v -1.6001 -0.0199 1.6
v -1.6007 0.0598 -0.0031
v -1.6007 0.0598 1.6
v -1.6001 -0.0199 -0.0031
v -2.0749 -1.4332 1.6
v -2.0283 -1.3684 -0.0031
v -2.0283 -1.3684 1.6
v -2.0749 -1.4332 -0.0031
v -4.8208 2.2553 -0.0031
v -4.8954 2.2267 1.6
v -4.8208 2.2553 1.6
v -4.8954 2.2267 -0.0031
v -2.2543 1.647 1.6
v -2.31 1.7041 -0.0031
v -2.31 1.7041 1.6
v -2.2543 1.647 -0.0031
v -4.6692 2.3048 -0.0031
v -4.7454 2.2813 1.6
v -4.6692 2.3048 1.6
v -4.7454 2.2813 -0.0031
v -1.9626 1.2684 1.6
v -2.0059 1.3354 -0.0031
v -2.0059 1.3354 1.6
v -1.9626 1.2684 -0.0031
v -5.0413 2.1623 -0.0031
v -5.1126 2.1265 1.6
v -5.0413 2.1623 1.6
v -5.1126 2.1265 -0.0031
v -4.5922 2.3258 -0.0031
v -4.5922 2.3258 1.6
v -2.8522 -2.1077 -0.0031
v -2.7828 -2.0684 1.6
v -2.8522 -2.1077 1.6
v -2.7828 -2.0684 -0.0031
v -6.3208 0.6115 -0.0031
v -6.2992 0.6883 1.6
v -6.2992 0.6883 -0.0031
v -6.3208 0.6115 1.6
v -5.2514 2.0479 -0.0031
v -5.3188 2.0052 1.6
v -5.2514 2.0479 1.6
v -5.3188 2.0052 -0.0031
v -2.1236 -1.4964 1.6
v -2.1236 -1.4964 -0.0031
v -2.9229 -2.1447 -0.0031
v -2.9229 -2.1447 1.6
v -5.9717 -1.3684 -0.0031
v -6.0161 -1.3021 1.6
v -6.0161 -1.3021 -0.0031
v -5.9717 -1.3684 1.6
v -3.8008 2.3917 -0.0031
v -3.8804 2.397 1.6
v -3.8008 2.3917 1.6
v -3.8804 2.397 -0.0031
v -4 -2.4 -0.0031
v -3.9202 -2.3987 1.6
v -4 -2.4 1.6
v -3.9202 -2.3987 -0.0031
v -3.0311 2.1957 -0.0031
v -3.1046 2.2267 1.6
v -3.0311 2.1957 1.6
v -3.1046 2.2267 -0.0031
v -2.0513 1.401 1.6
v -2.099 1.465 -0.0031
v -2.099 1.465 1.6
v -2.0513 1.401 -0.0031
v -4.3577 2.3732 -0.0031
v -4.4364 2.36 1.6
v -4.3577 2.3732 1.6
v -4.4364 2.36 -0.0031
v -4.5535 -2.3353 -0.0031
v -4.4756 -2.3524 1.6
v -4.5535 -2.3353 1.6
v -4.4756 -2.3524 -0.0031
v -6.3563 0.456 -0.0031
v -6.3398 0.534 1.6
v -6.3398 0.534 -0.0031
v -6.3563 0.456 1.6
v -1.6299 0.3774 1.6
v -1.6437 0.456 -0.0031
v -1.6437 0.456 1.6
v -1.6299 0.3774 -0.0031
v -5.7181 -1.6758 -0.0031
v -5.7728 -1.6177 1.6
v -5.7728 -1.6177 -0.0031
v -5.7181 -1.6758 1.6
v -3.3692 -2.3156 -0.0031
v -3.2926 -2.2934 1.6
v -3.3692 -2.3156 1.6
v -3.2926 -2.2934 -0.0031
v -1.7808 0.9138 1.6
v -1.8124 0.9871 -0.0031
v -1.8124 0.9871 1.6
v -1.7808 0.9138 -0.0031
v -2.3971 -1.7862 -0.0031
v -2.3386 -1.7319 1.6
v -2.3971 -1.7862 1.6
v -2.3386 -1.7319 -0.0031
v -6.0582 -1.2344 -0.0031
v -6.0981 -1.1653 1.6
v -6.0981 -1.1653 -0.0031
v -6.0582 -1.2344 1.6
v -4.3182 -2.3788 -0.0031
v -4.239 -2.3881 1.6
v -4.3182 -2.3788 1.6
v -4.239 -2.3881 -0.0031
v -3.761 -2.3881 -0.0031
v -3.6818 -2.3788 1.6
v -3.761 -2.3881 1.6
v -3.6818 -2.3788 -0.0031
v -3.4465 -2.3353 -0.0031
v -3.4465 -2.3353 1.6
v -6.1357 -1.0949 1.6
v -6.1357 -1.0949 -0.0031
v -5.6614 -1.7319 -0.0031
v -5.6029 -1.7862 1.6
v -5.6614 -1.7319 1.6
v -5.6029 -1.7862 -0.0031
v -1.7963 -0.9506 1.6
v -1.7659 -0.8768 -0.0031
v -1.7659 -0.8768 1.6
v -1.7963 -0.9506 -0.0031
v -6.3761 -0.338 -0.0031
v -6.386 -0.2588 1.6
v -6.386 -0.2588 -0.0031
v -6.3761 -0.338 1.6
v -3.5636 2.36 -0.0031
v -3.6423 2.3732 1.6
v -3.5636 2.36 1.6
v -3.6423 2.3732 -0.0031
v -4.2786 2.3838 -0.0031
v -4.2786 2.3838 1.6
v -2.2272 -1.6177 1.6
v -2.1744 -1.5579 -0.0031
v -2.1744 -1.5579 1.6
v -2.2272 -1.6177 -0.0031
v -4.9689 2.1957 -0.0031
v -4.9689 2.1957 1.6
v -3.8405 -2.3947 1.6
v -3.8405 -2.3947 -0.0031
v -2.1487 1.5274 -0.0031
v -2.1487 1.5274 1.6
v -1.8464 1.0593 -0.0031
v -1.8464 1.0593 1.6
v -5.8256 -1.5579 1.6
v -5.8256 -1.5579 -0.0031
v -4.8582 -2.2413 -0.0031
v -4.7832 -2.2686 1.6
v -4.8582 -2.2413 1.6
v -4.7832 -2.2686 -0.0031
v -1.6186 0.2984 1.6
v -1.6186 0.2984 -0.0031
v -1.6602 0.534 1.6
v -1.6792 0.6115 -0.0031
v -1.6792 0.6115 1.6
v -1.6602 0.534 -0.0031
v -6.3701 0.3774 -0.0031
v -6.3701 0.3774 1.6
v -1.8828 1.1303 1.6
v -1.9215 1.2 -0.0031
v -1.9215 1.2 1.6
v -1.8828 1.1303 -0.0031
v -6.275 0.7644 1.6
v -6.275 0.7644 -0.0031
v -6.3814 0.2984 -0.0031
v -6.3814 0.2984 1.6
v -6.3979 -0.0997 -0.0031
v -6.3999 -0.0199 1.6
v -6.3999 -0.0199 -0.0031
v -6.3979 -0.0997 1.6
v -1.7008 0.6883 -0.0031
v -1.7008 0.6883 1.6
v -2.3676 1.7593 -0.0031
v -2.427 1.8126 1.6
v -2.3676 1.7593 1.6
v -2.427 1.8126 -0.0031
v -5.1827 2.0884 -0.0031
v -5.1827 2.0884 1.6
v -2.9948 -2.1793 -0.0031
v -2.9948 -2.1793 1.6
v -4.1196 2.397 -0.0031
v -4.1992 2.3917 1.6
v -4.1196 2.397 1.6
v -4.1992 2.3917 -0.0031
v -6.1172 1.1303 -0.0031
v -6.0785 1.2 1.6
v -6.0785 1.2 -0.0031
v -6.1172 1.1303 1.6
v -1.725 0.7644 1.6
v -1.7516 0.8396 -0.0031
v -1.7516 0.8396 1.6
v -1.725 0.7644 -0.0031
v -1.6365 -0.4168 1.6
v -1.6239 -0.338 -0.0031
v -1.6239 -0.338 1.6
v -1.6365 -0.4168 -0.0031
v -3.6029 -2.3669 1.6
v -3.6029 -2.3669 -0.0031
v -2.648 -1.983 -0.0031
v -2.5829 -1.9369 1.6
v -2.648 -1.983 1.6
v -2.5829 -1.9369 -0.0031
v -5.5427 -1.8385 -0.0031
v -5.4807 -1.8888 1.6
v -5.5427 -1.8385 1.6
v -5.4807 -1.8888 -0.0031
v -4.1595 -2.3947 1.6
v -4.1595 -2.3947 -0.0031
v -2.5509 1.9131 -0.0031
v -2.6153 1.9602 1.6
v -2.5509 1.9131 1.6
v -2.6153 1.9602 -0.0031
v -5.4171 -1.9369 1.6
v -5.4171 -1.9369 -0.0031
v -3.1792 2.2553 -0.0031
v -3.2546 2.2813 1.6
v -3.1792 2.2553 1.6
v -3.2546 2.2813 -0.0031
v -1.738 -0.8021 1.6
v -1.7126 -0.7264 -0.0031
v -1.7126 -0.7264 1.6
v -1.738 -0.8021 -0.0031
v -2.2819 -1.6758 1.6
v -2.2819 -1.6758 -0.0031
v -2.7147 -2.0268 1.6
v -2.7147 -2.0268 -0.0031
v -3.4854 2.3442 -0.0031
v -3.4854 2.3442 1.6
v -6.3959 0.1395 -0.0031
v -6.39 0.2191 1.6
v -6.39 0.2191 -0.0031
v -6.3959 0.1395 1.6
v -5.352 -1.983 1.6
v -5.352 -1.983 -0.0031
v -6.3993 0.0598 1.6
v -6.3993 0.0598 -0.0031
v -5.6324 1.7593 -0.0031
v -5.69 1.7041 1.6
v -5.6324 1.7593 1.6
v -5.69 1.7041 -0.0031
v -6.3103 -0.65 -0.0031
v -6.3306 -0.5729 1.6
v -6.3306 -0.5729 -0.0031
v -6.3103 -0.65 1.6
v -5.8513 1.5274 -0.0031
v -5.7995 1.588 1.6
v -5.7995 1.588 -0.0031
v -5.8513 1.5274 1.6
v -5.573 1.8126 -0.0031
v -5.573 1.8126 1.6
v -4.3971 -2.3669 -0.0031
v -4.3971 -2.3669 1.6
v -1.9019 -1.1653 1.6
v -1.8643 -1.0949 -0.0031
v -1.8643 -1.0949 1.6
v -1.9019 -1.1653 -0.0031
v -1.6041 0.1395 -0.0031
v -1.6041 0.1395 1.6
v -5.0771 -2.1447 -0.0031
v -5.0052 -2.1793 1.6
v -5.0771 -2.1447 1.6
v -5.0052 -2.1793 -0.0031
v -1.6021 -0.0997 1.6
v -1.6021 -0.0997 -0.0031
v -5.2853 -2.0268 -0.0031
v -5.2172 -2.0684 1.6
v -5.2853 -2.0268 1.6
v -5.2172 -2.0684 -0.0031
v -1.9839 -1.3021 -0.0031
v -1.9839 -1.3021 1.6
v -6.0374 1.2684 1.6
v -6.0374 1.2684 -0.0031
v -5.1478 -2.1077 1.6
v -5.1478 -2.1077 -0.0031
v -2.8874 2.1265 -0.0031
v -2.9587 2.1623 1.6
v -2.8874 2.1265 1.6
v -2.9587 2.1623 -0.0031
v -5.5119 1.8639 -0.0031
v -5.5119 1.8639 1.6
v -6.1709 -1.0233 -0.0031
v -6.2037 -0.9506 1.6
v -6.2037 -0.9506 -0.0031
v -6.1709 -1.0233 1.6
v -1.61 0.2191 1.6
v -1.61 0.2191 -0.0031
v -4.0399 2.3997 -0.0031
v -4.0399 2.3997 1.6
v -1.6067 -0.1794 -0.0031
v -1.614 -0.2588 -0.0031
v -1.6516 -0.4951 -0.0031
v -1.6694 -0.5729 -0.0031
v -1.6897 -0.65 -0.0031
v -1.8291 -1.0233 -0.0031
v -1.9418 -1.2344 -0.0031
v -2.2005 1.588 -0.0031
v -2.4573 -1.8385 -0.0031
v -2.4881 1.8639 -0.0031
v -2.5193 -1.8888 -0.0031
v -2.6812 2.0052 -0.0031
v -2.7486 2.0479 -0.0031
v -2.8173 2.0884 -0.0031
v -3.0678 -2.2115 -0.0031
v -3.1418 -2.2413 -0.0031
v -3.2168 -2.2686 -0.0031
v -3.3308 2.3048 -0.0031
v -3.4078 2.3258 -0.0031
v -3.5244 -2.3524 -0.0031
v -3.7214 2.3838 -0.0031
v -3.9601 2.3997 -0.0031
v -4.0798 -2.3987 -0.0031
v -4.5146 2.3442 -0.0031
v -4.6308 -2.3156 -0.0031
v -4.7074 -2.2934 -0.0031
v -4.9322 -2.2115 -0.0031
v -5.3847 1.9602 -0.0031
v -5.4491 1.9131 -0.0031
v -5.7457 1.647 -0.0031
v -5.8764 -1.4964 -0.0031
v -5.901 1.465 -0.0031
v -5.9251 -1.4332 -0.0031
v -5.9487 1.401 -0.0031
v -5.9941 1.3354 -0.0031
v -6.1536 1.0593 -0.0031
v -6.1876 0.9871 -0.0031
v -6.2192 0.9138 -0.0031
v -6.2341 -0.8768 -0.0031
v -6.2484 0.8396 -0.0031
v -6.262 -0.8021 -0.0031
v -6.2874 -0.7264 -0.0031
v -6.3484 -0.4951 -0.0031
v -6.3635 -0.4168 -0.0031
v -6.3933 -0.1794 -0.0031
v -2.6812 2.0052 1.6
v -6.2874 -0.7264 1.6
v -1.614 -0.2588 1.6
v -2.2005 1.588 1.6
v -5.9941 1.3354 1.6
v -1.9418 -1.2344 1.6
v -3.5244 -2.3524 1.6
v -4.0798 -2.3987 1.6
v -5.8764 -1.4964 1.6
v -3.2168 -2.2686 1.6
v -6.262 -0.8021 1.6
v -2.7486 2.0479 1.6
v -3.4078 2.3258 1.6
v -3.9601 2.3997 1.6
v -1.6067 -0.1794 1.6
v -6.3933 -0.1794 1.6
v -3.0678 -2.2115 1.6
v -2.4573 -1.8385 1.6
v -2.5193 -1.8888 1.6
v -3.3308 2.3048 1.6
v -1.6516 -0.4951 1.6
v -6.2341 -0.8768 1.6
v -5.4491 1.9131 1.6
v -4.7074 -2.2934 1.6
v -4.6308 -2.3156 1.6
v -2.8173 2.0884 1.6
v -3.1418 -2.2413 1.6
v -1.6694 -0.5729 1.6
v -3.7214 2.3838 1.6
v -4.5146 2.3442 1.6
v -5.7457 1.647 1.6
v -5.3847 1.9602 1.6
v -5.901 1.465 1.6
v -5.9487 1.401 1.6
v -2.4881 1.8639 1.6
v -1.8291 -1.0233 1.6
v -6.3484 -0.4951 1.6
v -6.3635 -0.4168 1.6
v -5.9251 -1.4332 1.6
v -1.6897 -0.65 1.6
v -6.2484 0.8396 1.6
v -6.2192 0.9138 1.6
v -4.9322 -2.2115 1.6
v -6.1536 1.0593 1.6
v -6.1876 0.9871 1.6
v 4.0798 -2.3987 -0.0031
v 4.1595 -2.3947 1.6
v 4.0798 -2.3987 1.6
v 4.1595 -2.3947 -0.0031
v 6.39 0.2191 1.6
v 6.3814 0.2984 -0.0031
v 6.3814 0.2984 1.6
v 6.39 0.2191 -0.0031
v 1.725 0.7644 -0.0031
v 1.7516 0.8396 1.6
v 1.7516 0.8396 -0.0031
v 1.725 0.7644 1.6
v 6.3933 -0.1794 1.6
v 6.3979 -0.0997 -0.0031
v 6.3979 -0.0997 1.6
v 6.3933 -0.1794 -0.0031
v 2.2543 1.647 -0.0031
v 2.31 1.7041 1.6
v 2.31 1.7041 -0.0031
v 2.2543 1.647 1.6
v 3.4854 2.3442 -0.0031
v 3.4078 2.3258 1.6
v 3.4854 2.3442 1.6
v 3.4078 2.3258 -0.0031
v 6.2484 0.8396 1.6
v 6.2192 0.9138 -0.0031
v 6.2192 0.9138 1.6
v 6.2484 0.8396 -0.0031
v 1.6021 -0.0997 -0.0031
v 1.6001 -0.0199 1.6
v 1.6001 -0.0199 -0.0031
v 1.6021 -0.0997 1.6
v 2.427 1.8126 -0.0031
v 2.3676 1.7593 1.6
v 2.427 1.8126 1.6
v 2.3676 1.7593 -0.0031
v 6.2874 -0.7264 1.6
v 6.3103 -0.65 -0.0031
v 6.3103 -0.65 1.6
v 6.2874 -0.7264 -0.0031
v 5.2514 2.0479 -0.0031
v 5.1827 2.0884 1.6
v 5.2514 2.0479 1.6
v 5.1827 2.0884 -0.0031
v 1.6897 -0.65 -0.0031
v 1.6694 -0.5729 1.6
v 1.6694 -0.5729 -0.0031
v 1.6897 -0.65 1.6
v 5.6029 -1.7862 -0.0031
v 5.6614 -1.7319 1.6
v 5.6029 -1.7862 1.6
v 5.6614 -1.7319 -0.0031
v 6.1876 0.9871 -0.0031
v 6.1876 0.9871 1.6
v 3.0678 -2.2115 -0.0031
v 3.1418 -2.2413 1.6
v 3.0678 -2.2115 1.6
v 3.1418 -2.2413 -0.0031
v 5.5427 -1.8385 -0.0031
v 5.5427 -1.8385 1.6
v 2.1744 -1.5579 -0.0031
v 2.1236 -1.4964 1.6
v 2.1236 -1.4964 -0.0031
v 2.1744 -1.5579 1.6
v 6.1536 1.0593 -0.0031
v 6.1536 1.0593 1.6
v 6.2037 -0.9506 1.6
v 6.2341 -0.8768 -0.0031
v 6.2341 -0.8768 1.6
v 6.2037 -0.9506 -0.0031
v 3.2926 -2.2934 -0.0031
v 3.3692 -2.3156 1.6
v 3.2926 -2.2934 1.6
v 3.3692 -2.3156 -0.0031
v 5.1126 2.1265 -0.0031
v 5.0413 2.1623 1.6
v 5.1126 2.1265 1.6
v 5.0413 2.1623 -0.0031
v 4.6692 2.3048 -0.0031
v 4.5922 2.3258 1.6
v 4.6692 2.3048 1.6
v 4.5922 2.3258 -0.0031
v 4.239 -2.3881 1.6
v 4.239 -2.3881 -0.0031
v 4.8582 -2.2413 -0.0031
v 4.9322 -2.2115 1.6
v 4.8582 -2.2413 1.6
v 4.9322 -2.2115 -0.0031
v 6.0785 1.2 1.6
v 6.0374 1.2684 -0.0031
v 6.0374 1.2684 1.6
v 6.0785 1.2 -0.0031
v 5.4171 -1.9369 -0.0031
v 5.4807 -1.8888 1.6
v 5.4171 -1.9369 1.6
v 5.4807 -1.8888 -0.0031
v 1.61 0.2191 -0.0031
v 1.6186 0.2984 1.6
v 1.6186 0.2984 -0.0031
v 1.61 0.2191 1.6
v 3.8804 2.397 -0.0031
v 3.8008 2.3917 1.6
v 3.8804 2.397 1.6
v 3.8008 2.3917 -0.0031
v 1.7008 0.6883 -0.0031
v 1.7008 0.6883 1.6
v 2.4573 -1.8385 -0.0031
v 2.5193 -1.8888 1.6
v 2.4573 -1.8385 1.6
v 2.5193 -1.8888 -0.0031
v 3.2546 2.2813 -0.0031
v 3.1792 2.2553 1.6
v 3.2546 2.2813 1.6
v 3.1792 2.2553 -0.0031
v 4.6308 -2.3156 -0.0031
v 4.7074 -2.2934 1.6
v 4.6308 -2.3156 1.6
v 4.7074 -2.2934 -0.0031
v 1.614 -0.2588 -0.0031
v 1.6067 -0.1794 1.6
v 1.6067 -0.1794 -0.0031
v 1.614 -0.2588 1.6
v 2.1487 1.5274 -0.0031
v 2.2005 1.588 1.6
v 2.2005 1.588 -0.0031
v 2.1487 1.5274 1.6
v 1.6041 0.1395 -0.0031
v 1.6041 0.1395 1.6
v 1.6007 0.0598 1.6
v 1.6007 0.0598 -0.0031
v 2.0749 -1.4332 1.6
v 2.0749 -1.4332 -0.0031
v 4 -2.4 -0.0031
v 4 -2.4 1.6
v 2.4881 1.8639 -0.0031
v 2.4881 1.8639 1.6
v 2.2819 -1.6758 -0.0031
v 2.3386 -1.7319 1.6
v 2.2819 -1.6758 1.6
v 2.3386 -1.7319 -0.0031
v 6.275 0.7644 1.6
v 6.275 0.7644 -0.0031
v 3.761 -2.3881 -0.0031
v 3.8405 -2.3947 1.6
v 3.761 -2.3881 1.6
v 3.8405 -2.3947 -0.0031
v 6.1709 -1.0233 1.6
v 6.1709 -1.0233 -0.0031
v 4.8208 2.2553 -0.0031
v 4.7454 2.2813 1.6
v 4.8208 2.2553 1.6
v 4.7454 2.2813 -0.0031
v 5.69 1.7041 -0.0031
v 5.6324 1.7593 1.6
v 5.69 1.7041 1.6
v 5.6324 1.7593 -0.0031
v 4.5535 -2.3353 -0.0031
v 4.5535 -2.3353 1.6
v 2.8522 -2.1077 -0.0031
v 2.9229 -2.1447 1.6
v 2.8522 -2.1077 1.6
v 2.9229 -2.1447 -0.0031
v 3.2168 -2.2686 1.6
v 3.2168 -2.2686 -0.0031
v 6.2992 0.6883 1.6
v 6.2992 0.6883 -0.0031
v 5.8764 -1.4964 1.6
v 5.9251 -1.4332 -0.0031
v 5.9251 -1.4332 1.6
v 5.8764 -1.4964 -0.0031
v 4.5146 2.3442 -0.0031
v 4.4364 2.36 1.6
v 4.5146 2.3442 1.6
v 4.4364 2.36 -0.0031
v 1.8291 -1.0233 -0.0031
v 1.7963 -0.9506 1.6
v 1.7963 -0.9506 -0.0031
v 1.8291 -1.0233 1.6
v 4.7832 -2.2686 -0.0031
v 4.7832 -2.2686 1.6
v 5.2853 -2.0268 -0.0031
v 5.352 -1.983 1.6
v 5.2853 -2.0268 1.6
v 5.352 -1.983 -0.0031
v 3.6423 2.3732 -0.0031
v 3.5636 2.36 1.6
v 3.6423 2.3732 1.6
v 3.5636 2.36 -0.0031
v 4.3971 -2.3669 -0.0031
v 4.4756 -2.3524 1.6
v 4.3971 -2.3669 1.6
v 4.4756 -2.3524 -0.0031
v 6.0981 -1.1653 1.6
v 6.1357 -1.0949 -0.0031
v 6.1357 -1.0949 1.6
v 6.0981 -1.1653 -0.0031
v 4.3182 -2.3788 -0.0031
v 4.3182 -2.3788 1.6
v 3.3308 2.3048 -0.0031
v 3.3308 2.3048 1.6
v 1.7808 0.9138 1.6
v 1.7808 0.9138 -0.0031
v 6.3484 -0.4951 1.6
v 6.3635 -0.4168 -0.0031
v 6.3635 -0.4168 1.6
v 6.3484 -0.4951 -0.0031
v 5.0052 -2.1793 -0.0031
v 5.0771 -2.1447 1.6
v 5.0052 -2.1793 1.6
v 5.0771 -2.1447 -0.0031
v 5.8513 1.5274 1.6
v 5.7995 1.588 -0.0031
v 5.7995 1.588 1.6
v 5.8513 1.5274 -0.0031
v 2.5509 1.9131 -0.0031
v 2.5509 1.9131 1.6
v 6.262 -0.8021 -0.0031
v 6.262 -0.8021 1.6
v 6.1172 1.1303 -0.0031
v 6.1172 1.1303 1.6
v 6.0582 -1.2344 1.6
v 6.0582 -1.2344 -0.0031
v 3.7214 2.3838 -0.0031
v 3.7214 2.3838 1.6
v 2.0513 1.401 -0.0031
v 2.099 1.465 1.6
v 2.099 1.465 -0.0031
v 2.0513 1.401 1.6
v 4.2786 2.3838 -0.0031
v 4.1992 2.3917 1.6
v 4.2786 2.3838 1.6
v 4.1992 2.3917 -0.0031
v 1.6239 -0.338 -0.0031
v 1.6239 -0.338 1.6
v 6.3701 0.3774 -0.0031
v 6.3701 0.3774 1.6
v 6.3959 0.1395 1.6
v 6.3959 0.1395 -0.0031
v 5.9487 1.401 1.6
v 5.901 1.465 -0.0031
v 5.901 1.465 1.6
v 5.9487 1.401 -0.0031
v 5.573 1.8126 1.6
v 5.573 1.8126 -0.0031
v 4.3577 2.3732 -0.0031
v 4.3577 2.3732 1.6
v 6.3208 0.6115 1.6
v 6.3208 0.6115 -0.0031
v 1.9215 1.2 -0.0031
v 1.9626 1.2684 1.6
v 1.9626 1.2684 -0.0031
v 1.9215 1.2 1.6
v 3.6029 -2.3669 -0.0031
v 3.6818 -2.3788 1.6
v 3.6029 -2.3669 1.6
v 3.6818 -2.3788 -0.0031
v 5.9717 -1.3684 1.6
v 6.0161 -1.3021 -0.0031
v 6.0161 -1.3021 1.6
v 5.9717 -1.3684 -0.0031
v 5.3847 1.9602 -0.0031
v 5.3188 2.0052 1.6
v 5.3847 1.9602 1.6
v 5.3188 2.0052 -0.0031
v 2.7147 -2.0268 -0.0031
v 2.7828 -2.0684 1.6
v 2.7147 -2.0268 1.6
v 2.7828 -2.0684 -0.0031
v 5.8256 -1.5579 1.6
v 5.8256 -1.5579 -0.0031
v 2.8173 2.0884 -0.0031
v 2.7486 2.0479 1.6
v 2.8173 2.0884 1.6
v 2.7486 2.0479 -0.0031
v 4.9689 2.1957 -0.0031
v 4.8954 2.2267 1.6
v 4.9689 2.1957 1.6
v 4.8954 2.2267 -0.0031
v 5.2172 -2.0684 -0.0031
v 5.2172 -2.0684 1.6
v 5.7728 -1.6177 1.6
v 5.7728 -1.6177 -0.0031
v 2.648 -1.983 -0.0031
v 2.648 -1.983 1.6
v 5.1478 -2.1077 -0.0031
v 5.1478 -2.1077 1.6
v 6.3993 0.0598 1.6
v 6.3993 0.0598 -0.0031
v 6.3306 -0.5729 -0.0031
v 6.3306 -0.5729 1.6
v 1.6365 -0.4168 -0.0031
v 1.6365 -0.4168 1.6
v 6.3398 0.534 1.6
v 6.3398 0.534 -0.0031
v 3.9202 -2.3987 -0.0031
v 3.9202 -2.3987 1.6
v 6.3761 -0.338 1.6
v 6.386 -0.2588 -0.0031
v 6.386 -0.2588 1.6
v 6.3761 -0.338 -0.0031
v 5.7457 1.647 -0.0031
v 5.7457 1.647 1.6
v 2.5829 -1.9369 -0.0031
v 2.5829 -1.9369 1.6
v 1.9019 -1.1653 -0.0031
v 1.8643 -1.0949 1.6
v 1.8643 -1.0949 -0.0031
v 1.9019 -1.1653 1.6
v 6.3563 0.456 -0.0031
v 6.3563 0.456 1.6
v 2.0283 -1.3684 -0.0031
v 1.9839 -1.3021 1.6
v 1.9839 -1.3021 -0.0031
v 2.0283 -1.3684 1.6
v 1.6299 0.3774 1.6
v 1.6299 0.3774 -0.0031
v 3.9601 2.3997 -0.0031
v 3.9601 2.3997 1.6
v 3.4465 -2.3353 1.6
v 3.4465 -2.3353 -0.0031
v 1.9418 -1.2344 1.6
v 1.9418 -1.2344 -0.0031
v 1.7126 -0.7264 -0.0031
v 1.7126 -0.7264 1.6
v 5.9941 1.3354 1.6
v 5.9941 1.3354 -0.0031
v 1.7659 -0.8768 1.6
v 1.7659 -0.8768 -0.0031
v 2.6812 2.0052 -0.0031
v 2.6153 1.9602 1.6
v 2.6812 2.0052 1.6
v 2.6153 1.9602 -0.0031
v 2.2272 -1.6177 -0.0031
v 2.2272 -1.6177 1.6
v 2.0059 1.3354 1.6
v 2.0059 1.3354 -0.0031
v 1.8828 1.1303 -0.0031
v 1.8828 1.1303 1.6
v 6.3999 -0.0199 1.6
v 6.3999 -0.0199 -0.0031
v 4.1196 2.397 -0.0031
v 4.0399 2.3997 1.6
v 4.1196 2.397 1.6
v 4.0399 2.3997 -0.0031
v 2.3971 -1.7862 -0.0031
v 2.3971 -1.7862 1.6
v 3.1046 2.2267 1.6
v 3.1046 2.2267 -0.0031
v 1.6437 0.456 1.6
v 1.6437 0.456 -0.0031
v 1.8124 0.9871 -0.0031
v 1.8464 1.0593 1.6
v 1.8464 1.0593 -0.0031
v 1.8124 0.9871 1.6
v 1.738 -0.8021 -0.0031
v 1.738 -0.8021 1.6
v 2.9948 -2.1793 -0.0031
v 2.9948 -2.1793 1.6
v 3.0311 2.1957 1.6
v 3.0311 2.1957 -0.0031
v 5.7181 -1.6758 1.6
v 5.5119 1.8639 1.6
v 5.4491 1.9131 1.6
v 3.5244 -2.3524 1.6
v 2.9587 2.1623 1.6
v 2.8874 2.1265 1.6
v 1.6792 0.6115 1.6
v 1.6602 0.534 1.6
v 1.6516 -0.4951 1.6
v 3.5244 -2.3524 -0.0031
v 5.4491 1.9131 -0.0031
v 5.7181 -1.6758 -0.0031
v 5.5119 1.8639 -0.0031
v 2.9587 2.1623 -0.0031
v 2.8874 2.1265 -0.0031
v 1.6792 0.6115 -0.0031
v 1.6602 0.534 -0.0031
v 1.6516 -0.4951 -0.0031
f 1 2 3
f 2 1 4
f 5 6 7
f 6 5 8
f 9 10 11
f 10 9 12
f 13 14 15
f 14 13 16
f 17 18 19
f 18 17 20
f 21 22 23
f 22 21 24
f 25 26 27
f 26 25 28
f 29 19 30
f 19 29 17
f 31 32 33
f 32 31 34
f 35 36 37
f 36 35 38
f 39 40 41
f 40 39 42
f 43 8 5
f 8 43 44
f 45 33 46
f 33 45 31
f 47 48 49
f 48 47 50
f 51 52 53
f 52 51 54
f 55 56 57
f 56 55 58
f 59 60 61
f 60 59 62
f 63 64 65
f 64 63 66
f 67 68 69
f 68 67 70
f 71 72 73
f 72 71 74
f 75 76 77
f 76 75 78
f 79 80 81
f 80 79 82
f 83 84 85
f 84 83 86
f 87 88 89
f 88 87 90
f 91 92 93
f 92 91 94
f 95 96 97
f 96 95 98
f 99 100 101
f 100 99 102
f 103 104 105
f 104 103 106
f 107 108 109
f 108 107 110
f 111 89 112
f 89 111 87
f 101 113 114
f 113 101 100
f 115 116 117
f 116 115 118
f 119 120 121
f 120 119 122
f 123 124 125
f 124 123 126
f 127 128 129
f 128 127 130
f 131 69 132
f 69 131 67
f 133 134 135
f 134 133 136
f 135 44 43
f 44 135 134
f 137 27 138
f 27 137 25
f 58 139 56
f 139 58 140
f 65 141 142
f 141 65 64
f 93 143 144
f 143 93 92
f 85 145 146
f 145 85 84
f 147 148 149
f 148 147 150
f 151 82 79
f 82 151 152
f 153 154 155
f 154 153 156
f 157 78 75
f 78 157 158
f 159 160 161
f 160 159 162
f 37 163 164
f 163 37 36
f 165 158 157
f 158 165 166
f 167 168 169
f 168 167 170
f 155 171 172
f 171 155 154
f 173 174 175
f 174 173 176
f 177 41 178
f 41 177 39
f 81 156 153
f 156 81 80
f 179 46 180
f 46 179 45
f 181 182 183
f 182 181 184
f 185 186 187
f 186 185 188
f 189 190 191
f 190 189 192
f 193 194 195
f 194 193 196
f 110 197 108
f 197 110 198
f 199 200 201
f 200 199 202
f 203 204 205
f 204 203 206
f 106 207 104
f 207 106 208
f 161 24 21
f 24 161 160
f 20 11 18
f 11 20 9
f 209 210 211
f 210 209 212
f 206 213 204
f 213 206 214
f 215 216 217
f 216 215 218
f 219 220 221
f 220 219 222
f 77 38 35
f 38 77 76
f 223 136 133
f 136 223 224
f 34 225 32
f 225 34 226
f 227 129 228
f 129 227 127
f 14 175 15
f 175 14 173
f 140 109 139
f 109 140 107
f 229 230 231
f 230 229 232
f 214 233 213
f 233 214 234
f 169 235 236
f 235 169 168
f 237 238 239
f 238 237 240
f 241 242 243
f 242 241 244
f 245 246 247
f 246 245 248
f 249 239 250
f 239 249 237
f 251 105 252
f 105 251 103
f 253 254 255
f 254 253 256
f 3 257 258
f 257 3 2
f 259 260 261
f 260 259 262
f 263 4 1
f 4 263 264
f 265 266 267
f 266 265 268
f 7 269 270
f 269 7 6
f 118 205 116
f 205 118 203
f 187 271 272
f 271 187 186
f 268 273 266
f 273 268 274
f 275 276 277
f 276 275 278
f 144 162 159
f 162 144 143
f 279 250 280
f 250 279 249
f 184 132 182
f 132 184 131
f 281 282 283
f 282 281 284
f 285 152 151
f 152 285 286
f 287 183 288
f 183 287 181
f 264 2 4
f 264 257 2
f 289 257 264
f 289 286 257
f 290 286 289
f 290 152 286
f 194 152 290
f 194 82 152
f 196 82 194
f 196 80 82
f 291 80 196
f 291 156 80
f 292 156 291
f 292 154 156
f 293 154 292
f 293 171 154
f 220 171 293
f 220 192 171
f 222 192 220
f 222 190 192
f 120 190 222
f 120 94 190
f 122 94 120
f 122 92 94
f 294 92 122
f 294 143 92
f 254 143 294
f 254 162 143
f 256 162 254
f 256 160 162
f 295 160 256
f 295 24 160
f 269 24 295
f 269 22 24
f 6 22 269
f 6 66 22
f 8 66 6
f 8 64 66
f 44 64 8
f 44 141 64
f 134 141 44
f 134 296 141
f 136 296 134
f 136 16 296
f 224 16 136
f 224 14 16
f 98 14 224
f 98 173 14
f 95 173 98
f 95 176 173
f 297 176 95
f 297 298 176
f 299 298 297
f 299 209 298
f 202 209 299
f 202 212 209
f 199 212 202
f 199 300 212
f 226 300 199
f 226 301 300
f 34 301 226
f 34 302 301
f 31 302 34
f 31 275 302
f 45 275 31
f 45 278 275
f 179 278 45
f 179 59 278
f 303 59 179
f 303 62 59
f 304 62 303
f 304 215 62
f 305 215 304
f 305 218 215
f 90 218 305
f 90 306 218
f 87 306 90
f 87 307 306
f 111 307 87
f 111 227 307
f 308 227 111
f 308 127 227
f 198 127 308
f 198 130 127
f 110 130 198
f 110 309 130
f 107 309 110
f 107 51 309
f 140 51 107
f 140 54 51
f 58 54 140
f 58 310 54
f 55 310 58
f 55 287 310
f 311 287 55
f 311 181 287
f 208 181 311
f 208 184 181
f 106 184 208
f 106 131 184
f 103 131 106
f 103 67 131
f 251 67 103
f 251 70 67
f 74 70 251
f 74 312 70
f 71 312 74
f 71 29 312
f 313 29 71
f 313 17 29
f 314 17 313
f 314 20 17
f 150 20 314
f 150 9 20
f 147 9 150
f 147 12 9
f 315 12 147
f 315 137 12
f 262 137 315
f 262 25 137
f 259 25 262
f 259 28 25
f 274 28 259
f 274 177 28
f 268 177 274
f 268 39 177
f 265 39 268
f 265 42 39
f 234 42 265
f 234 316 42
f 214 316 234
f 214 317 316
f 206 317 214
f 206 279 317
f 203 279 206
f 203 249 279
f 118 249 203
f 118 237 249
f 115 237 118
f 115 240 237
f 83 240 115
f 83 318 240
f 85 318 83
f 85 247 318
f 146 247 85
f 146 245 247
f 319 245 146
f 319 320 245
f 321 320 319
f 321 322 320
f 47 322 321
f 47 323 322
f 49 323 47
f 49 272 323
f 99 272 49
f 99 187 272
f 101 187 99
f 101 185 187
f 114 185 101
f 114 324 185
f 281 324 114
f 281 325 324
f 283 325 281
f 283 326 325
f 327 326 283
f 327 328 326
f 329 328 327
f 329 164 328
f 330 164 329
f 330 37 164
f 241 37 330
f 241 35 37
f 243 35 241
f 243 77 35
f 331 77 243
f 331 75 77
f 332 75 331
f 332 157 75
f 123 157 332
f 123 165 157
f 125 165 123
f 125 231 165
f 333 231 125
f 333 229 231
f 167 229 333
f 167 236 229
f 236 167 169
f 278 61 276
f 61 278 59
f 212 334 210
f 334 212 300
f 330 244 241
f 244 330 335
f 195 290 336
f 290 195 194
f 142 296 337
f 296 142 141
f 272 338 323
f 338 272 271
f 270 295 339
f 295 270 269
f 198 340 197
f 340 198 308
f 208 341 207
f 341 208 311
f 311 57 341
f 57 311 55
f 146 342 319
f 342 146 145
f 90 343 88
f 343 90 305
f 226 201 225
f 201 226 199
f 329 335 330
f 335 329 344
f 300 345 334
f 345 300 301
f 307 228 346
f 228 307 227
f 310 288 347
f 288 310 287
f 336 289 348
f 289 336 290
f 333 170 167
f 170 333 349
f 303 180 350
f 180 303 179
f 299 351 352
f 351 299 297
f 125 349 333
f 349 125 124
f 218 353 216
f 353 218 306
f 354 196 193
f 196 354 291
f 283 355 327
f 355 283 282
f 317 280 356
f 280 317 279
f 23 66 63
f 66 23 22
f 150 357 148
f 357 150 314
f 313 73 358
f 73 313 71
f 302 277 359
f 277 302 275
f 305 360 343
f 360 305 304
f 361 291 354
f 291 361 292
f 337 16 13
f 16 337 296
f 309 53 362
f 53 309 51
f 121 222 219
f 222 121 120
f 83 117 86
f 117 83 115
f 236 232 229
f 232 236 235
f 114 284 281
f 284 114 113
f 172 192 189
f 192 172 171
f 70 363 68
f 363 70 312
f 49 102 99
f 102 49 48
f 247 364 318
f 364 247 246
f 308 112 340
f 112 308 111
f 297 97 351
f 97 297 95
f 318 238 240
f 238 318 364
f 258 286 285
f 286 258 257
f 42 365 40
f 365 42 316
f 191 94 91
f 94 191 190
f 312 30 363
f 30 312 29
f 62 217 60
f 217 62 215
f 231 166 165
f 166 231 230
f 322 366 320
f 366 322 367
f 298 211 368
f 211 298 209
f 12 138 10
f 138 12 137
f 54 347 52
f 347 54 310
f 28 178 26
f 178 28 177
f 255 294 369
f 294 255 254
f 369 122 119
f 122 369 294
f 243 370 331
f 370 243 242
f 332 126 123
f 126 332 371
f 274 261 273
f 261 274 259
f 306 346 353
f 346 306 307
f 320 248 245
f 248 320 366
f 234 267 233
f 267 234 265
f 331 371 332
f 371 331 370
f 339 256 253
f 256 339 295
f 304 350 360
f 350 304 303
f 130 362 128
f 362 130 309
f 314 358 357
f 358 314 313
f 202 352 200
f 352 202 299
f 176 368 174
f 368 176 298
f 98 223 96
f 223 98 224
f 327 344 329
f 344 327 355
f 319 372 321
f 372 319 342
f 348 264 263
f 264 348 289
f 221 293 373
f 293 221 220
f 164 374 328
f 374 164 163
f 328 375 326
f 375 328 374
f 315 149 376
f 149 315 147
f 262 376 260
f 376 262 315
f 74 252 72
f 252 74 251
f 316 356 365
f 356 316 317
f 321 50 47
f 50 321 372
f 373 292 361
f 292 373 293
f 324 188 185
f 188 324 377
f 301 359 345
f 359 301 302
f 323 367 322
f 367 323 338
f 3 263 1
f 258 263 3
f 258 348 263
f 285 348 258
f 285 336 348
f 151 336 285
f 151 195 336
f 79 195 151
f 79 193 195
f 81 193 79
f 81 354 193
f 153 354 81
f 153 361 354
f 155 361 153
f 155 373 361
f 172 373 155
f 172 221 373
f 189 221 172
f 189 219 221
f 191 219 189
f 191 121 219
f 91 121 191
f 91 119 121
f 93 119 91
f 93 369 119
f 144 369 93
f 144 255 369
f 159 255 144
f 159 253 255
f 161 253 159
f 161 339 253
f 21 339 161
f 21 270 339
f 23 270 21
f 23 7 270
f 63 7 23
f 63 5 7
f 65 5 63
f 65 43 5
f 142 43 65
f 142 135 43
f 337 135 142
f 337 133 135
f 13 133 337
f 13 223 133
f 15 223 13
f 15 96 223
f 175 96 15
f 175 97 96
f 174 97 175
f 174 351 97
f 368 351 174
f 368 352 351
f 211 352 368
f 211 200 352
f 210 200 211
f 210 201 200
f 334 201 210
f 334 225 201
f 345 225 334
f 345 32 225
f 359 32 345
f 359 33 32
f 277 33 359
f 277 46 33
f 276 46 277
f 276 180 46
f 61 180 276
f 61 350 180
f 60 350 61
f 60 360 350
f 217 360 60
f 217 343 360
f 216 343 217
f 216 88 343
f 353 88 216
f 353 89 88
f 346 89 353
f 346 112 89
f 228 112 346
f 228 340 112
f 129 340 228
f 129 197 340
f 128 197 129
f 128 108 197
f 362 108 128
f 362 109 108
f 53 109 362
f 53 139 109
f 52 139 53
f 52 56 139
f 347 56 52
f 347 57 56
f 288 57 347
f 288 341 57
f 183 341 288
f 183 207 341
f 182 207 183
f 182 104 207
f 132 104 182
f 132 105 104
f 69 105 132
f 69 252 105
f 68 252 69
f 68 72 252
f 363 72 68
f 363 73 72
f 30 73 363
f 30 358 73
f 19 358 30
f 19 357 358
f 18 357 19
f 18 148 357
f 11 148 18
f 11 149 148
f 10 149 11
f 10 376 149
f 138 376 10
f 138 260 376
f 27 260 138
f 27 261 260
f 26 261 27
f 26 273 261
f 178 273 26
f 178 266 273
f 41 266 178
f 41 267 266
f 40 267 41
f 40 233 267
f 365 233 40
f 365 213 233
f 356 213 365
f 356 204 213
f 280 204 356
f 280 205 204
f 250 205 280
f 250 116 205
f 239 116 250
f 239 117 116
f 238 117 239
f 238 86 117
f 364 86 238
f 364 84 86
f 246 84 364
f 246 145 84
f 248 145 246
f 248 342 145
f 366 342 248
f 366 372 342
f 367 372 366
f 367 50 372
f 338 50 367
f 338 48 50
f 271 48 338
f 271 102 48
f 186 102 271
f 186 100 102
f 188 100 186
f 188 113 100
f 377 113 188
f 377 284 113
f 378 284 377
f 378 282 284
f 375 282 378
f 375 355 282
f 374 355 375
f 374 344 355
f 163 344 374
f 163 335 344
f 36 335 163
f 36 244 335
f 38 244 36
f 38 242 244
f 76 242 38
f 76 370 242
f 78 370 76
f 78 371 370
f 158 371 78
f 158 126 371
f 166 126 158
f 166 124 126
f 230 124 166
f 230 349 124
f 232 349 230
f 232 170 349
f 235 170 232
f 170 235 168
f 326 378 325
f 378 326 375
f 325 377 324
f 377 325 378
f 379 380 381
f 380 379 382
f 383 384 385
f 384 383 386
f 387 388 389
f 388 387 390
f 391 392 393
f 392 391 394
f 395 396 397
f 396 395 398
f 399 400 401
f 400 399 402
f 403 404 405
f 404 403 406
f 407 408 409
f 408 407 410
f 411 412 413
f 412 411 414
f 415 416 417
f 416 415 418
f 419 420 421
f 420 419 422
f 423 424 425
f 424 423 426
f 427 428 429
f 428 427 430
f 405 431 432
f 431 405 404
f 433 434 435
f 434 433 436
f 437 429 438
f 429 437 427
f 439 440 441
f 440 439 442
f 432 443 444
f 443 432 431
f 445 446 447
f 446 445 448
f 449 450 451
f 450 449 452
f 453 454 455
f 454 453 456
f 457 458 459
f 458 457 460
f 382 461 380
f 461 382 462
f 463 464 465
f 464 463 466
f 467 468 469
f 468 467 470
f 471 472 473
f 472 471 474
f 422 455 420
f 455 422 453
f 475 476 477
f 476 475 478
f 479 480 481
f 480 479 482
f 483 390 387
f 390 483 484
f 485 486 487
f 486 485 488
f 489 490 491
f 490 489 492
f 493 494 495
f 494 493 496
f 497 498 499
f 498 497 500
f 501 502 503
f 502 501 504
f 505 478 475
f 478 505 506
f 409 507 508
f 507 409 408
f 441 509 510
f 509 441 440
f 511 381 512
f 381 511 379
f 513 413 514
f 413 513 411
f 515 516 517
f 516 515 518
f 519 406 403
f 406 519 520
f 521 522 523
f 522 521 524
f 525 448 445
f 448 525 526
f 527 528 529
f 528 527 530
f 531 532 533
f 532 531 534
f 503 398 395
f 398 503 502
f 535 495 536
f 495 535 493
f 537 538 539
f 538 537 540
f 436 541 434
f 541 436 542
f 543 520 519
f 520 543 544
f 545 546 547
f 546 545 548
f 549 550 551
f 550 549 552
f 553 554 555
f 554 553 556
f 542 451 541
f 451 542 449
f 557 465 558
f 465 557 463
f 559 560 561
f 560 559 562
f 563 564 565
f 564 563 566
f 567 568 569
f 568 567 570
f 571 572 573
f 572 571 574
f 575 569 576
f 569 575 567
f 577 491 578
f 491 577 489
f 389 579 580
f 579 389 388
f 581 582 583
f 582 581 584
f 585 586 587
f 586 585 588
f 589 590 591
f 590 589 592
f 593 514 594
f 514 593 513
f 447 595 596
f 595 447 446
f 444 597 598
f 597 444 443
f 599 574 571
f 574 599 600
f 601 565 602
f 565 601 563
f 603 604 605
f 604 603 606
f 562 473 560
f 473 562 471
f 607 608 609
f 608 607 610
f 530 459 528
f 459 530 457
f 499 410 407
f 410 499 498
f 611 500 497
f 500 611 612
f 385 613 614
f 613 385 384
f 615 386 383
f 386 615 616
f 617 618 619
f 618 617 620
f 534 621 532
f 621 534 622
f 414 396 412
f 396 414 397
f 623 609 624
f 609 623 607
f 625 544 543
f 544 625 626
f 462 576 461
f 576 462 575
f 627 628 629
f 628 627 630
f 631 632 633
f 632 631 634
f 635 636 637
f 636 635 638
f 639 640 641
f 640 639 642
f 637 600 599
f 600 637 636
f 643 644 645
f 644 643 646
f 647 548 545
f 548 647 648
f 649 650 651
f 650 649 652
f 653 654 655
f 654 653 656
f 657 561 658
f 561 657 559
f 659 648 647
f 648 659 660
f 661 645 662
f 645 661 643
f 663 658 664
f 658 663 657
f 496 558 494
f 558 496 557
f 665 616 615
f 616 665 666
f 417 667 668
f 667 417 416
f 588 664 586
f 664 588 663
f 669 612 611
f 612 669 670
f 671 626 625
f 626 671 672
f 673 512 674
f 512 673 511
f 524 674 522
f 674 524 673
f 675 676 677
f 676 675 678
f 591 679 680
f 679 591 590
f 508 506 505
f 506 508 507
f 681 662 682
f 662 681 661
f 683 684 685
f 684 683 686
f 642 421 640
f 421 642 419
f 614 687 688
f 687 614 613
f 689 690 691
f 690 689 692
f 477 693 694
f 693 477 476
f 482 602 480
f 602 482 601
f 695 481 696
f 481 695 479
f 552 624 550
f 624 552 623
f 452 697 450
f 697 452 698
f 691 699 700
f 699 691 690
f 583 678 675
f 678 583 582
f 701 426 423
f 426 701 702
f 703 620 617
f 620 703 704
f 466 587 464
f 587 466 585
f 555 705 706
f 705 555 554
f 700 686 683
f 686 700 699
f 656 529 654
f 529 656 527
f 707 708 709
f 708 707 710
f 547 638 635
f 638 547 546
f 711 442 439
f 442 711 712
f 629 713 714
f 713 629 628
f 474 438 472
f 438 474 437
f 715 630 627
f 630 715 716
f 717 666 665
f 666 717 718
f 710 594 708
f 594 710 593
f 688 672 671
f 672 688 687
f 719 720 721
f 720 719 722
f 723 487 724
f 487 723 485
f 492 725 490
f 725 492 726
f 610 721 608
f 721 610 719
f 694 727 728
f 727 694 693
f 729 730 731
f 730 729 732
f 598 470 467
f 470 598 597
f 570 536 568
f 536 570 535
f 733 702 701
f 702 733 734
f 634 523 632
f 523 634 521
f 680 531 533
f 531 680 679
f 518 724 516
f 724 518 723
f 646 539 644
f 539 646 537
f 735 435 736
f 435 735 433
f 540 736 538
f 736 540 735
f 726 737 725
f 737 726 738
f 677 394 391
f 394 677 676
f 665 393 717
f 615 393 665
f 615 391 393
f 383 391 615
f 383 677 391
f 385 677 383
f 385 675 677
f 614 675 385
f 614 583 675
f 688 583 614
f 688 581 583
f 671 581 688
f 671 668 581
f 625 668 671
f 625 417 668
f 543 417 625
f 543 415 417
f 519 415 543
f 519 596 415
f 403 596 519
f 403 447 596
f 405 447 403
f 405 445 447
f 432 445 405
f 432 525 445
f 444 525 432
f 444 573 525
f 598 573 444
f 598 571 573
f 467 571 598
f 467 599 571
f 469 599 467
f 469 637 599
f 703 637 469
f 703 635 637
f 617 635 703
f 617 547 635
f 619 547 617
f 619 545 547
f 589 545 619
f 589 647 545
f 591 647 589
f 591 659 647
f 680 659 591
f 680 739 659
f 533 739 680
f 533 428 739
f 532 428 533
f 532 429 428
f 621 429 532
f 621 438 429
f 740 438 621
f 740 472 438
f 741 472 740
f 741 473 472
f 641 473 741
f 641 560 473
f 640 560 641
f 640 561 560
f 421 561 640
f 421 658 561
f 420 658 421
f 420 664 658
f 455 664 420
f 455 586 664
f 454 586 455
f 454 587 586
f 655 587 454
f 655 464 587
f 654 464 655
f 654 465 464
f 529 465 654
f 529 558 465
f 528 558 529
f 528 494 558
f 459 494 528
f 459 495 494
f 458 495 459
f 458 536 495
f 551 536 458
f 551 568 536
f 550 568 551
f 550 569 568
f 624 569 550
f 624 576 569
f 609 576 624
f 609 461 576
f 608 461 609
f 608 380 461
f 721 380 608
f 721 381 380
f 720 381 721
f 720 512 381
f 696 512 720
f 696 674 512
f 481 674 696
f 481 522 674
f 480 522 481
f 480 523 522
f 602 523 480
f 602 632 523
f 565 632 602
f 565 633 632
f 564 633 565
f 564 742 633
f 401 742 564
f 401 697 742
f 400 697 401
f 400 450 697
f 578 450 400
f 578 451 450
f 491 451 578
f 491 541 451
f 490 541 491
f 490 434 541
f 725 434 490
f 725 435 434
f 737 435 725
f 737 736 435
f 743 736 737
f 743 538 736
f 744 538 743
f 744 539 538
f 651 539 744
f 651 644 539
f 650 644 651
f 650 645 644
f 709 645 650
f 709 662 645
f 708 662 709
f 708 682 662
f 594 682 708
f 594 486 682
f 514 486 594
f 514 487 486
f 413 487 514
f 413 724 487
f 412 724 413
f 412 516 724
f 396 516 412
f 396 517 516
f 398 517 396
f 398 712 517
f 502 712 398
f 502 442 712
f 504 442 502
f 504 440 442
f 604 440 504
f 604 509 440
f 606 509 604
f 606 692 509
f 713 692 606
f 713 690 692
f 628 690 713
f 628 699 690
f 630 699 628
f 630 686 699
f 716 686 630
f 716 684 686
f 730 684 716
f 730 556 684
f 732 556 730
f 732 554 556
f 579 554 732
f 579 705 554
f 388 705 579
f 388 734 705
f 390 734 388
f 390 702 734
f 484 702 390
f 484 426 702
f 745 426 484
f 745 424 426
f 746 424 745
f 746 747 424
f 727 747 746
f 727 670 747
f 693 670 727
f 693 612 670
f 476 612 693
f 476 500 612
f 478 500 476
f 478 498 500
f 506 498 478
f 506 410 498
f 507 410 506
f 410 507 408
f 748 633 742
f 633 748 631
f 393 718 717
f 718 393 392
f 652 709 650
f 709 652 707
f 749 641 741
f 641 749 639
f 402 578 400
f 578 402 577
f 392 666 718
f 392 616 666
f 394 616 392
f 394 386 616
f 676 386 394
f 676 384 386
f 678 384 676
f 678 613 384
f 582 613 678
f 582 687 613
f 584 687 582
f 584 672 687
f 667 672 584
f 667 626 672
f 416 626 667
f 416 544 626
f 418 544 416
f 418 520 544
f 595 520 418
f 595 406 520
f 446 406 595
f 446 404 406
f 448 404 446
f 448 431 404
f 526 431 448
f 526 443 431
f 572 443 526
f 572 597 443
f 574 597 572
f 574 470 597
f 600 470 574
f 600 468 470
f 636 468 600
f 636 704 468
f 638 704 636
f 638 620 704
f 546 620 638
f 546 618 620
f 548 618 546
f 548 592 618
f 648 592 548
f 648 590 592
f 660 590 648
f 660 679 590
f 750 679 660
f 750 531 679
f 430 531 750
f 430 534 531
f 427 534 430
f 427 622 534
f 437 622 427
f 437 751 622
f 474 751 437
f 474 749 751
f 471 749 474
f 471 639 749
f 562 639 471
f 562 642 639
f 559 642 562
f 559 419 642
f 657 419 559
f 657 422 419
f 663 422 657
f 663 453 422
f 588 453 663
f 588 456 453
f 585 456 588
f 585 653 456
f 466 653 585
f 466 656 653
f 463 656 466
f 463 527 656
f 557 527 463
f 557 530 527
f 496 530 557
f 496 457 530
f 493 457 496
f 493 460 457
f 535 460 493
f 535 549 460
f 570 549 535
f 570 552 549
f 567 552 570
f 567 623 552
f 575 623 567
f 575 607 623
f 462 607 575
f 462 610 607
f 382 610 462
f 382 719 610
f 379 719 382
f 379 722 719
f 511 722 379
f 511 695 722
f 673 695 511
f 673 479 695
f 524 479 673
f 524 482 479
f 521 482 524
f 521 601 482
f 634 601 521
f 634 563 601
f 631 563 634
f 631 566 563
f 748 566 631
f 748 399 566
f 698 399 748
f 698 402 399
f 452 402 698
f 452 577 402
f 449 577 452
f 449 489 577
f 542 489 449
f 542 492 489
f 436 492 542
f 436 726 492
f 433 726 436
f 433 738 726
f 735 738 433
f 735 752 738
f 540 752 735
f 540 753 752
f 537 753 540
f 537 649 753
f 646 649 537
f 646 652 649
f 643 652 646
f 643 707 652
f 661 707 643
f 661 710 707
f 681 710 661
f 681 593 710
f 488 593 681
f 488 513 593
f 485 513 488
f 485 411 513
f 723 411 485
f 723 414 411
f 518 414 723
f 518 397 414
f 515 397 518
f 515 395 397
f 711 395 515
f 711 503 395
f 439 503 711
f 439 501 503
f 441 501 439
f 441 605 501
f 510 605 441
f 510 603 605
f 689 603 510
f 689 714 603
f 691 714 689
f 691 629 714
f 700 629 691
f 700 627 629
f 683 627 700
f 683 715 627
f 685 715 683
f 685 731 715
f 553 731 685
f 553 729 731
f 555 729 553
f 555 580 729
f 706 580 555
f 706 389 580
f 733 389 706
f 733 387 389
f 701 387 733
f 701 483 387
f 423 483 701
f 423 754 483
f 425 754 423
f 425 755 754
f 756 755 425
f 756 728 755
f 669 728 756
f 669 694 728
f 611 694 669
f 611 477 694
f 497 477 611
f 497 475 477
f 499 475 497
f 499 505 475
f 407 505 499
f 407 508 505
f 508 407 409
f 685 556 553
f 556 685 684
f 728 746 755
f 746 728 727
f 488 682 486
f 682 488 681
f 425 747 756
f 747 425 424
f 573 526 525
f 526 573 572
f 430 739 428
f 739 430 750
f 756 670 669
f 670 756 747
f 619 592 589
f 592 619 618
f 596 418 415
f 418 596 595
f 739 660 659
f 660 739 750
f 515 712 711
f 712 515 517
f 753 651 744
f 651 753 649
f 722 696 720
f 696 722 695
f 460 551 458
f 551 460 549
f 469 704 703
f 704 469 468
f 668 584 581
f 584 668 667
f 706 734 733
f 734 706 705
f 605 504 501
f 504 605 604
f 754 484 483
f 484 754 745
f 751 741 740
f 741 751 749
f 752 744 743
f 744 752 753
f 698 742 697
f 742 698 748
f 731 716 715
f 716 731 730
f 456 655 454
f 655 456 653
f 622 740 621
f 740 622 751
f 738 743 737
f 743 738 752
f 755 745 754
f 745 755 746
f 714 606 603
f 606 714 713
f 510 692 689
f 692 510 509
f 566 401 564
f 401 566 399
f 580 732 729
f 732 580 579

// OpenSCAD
use <../lib.scad>
use <s/41855s01.scad>
$fa=1; $fs=0.2;
function ldraw_lib__41855(realsolid=false) = [
// 0 Slope Brick Rounded  2 x  2 x  0.667
// 0 Name: 41855.dat
// 0 Author: Franklin W. Cain [fwcain]
// 0 !LDRAW_ORG Part UPDATE 2014-02
// 0 !LICENSE Licensed under CC BY 2.0 and CC BY 4.0 : see CAreadme.txt
// 
// 0 BFC CERTIFY CCW
  [0,"BFC","CERTIFY"],
  [0,"BFC","CCW"],
// 
// 0 !KEYWORDS Alpha Team, bonnet, Car, curved, hood, Racers
// 
// 0 !HISTORY 2003-12-19 [PTadmin] Official Update 2003-03
// 0 !HISTORY 2005-12-28 [PTadmin] Official Update 2005-01
// 0 !HISTORY 2007-07-04 [PTadmin] Header formatted for Contributor Agreement
// 0 !HISTORY 2008-07-01 [PTadmin] Official Update 2008-01
// 0 !HISTORY 2014-11-04 [MagFors] Made BFC
// 0 !HISTORY 2014-12-23 [PTadmin] Official Update 2014-02
// 
// 
// 1 16 0 0 0 1 0 0 0 1 0 0 0 1 s\41855s01.dat
  [1,16,0,0,0,1,0,0,0,1,0,0,0,1, ldraw_lib__s__41855s01(realsolid)],
// 
// 4 16 -10 1.5 -20 10 1.5 -20 10 0 -10 -10 0 -10
  [4,16,-10,1.5,-20,10,1.5,-20,10,0,-10,-10,0,-10],
// 4 16 -10 4 -30 10 4 -30 10 1.5 -20 -10 1.5 -20
  [4,16,-10,4,-30,10,4,-30,10,1.5,-20,-10,1.5,-20],
// 3 16 -20 8.5 -10 -10 1.5 -20 -10 0 -10
  [3,16,-20,8.5,-10,-10,1.5,-20,-10,0,-10],
// 3 16 10 0 -10 10 1.5 -20 20 8.5 -10
  [3,16,10,0,-10,10,1.5,-20,20,8.5,-10],
// 3 16 -10 1.5 -20 -20 8.5 -10 -20 10 -20
  [3,16,-10,1.5,-20,-20,8.5,-10,-20,10,-20],
// 3 16 20 10 -20 20 8.5 -10 10 1.5 -20
  [3,16,20,10,-20,20,8.5,-10,10,1.5,-20],
// 3 16 -20 10 -20 -10 4 -30 -10 1.5 -20
  [3,16,-20,10,-20,-10,4,-30,-10,1.5,-20],
// 3 16 10 1.5 -20 10 4 -30 20 10 -20
  [3,16,10,1.5,-20,10,4,-30,20,10,-20],
// 3 16 -10 4 -30 -20 10 -20 -20 12 -30
  [3,16,-10,4,-30,-20,10,-20,-20,12,-30],
// 3 16 20 12 -30 20 10 -20 10 4 -30
  [3,16,20,12,-30,20,10,-20,10,4,-30],
];
module ldraw_lib__41855(step=0, col=false, unit=2/5, alt=false, line=0.2, solid=!$preview)
    makepoly(ldraw_lib__41855(solid), step=step, col=col, unit=unit, alt=alt, line=line, solid=solid);
ldraw_lib__41855(line=0.2);
